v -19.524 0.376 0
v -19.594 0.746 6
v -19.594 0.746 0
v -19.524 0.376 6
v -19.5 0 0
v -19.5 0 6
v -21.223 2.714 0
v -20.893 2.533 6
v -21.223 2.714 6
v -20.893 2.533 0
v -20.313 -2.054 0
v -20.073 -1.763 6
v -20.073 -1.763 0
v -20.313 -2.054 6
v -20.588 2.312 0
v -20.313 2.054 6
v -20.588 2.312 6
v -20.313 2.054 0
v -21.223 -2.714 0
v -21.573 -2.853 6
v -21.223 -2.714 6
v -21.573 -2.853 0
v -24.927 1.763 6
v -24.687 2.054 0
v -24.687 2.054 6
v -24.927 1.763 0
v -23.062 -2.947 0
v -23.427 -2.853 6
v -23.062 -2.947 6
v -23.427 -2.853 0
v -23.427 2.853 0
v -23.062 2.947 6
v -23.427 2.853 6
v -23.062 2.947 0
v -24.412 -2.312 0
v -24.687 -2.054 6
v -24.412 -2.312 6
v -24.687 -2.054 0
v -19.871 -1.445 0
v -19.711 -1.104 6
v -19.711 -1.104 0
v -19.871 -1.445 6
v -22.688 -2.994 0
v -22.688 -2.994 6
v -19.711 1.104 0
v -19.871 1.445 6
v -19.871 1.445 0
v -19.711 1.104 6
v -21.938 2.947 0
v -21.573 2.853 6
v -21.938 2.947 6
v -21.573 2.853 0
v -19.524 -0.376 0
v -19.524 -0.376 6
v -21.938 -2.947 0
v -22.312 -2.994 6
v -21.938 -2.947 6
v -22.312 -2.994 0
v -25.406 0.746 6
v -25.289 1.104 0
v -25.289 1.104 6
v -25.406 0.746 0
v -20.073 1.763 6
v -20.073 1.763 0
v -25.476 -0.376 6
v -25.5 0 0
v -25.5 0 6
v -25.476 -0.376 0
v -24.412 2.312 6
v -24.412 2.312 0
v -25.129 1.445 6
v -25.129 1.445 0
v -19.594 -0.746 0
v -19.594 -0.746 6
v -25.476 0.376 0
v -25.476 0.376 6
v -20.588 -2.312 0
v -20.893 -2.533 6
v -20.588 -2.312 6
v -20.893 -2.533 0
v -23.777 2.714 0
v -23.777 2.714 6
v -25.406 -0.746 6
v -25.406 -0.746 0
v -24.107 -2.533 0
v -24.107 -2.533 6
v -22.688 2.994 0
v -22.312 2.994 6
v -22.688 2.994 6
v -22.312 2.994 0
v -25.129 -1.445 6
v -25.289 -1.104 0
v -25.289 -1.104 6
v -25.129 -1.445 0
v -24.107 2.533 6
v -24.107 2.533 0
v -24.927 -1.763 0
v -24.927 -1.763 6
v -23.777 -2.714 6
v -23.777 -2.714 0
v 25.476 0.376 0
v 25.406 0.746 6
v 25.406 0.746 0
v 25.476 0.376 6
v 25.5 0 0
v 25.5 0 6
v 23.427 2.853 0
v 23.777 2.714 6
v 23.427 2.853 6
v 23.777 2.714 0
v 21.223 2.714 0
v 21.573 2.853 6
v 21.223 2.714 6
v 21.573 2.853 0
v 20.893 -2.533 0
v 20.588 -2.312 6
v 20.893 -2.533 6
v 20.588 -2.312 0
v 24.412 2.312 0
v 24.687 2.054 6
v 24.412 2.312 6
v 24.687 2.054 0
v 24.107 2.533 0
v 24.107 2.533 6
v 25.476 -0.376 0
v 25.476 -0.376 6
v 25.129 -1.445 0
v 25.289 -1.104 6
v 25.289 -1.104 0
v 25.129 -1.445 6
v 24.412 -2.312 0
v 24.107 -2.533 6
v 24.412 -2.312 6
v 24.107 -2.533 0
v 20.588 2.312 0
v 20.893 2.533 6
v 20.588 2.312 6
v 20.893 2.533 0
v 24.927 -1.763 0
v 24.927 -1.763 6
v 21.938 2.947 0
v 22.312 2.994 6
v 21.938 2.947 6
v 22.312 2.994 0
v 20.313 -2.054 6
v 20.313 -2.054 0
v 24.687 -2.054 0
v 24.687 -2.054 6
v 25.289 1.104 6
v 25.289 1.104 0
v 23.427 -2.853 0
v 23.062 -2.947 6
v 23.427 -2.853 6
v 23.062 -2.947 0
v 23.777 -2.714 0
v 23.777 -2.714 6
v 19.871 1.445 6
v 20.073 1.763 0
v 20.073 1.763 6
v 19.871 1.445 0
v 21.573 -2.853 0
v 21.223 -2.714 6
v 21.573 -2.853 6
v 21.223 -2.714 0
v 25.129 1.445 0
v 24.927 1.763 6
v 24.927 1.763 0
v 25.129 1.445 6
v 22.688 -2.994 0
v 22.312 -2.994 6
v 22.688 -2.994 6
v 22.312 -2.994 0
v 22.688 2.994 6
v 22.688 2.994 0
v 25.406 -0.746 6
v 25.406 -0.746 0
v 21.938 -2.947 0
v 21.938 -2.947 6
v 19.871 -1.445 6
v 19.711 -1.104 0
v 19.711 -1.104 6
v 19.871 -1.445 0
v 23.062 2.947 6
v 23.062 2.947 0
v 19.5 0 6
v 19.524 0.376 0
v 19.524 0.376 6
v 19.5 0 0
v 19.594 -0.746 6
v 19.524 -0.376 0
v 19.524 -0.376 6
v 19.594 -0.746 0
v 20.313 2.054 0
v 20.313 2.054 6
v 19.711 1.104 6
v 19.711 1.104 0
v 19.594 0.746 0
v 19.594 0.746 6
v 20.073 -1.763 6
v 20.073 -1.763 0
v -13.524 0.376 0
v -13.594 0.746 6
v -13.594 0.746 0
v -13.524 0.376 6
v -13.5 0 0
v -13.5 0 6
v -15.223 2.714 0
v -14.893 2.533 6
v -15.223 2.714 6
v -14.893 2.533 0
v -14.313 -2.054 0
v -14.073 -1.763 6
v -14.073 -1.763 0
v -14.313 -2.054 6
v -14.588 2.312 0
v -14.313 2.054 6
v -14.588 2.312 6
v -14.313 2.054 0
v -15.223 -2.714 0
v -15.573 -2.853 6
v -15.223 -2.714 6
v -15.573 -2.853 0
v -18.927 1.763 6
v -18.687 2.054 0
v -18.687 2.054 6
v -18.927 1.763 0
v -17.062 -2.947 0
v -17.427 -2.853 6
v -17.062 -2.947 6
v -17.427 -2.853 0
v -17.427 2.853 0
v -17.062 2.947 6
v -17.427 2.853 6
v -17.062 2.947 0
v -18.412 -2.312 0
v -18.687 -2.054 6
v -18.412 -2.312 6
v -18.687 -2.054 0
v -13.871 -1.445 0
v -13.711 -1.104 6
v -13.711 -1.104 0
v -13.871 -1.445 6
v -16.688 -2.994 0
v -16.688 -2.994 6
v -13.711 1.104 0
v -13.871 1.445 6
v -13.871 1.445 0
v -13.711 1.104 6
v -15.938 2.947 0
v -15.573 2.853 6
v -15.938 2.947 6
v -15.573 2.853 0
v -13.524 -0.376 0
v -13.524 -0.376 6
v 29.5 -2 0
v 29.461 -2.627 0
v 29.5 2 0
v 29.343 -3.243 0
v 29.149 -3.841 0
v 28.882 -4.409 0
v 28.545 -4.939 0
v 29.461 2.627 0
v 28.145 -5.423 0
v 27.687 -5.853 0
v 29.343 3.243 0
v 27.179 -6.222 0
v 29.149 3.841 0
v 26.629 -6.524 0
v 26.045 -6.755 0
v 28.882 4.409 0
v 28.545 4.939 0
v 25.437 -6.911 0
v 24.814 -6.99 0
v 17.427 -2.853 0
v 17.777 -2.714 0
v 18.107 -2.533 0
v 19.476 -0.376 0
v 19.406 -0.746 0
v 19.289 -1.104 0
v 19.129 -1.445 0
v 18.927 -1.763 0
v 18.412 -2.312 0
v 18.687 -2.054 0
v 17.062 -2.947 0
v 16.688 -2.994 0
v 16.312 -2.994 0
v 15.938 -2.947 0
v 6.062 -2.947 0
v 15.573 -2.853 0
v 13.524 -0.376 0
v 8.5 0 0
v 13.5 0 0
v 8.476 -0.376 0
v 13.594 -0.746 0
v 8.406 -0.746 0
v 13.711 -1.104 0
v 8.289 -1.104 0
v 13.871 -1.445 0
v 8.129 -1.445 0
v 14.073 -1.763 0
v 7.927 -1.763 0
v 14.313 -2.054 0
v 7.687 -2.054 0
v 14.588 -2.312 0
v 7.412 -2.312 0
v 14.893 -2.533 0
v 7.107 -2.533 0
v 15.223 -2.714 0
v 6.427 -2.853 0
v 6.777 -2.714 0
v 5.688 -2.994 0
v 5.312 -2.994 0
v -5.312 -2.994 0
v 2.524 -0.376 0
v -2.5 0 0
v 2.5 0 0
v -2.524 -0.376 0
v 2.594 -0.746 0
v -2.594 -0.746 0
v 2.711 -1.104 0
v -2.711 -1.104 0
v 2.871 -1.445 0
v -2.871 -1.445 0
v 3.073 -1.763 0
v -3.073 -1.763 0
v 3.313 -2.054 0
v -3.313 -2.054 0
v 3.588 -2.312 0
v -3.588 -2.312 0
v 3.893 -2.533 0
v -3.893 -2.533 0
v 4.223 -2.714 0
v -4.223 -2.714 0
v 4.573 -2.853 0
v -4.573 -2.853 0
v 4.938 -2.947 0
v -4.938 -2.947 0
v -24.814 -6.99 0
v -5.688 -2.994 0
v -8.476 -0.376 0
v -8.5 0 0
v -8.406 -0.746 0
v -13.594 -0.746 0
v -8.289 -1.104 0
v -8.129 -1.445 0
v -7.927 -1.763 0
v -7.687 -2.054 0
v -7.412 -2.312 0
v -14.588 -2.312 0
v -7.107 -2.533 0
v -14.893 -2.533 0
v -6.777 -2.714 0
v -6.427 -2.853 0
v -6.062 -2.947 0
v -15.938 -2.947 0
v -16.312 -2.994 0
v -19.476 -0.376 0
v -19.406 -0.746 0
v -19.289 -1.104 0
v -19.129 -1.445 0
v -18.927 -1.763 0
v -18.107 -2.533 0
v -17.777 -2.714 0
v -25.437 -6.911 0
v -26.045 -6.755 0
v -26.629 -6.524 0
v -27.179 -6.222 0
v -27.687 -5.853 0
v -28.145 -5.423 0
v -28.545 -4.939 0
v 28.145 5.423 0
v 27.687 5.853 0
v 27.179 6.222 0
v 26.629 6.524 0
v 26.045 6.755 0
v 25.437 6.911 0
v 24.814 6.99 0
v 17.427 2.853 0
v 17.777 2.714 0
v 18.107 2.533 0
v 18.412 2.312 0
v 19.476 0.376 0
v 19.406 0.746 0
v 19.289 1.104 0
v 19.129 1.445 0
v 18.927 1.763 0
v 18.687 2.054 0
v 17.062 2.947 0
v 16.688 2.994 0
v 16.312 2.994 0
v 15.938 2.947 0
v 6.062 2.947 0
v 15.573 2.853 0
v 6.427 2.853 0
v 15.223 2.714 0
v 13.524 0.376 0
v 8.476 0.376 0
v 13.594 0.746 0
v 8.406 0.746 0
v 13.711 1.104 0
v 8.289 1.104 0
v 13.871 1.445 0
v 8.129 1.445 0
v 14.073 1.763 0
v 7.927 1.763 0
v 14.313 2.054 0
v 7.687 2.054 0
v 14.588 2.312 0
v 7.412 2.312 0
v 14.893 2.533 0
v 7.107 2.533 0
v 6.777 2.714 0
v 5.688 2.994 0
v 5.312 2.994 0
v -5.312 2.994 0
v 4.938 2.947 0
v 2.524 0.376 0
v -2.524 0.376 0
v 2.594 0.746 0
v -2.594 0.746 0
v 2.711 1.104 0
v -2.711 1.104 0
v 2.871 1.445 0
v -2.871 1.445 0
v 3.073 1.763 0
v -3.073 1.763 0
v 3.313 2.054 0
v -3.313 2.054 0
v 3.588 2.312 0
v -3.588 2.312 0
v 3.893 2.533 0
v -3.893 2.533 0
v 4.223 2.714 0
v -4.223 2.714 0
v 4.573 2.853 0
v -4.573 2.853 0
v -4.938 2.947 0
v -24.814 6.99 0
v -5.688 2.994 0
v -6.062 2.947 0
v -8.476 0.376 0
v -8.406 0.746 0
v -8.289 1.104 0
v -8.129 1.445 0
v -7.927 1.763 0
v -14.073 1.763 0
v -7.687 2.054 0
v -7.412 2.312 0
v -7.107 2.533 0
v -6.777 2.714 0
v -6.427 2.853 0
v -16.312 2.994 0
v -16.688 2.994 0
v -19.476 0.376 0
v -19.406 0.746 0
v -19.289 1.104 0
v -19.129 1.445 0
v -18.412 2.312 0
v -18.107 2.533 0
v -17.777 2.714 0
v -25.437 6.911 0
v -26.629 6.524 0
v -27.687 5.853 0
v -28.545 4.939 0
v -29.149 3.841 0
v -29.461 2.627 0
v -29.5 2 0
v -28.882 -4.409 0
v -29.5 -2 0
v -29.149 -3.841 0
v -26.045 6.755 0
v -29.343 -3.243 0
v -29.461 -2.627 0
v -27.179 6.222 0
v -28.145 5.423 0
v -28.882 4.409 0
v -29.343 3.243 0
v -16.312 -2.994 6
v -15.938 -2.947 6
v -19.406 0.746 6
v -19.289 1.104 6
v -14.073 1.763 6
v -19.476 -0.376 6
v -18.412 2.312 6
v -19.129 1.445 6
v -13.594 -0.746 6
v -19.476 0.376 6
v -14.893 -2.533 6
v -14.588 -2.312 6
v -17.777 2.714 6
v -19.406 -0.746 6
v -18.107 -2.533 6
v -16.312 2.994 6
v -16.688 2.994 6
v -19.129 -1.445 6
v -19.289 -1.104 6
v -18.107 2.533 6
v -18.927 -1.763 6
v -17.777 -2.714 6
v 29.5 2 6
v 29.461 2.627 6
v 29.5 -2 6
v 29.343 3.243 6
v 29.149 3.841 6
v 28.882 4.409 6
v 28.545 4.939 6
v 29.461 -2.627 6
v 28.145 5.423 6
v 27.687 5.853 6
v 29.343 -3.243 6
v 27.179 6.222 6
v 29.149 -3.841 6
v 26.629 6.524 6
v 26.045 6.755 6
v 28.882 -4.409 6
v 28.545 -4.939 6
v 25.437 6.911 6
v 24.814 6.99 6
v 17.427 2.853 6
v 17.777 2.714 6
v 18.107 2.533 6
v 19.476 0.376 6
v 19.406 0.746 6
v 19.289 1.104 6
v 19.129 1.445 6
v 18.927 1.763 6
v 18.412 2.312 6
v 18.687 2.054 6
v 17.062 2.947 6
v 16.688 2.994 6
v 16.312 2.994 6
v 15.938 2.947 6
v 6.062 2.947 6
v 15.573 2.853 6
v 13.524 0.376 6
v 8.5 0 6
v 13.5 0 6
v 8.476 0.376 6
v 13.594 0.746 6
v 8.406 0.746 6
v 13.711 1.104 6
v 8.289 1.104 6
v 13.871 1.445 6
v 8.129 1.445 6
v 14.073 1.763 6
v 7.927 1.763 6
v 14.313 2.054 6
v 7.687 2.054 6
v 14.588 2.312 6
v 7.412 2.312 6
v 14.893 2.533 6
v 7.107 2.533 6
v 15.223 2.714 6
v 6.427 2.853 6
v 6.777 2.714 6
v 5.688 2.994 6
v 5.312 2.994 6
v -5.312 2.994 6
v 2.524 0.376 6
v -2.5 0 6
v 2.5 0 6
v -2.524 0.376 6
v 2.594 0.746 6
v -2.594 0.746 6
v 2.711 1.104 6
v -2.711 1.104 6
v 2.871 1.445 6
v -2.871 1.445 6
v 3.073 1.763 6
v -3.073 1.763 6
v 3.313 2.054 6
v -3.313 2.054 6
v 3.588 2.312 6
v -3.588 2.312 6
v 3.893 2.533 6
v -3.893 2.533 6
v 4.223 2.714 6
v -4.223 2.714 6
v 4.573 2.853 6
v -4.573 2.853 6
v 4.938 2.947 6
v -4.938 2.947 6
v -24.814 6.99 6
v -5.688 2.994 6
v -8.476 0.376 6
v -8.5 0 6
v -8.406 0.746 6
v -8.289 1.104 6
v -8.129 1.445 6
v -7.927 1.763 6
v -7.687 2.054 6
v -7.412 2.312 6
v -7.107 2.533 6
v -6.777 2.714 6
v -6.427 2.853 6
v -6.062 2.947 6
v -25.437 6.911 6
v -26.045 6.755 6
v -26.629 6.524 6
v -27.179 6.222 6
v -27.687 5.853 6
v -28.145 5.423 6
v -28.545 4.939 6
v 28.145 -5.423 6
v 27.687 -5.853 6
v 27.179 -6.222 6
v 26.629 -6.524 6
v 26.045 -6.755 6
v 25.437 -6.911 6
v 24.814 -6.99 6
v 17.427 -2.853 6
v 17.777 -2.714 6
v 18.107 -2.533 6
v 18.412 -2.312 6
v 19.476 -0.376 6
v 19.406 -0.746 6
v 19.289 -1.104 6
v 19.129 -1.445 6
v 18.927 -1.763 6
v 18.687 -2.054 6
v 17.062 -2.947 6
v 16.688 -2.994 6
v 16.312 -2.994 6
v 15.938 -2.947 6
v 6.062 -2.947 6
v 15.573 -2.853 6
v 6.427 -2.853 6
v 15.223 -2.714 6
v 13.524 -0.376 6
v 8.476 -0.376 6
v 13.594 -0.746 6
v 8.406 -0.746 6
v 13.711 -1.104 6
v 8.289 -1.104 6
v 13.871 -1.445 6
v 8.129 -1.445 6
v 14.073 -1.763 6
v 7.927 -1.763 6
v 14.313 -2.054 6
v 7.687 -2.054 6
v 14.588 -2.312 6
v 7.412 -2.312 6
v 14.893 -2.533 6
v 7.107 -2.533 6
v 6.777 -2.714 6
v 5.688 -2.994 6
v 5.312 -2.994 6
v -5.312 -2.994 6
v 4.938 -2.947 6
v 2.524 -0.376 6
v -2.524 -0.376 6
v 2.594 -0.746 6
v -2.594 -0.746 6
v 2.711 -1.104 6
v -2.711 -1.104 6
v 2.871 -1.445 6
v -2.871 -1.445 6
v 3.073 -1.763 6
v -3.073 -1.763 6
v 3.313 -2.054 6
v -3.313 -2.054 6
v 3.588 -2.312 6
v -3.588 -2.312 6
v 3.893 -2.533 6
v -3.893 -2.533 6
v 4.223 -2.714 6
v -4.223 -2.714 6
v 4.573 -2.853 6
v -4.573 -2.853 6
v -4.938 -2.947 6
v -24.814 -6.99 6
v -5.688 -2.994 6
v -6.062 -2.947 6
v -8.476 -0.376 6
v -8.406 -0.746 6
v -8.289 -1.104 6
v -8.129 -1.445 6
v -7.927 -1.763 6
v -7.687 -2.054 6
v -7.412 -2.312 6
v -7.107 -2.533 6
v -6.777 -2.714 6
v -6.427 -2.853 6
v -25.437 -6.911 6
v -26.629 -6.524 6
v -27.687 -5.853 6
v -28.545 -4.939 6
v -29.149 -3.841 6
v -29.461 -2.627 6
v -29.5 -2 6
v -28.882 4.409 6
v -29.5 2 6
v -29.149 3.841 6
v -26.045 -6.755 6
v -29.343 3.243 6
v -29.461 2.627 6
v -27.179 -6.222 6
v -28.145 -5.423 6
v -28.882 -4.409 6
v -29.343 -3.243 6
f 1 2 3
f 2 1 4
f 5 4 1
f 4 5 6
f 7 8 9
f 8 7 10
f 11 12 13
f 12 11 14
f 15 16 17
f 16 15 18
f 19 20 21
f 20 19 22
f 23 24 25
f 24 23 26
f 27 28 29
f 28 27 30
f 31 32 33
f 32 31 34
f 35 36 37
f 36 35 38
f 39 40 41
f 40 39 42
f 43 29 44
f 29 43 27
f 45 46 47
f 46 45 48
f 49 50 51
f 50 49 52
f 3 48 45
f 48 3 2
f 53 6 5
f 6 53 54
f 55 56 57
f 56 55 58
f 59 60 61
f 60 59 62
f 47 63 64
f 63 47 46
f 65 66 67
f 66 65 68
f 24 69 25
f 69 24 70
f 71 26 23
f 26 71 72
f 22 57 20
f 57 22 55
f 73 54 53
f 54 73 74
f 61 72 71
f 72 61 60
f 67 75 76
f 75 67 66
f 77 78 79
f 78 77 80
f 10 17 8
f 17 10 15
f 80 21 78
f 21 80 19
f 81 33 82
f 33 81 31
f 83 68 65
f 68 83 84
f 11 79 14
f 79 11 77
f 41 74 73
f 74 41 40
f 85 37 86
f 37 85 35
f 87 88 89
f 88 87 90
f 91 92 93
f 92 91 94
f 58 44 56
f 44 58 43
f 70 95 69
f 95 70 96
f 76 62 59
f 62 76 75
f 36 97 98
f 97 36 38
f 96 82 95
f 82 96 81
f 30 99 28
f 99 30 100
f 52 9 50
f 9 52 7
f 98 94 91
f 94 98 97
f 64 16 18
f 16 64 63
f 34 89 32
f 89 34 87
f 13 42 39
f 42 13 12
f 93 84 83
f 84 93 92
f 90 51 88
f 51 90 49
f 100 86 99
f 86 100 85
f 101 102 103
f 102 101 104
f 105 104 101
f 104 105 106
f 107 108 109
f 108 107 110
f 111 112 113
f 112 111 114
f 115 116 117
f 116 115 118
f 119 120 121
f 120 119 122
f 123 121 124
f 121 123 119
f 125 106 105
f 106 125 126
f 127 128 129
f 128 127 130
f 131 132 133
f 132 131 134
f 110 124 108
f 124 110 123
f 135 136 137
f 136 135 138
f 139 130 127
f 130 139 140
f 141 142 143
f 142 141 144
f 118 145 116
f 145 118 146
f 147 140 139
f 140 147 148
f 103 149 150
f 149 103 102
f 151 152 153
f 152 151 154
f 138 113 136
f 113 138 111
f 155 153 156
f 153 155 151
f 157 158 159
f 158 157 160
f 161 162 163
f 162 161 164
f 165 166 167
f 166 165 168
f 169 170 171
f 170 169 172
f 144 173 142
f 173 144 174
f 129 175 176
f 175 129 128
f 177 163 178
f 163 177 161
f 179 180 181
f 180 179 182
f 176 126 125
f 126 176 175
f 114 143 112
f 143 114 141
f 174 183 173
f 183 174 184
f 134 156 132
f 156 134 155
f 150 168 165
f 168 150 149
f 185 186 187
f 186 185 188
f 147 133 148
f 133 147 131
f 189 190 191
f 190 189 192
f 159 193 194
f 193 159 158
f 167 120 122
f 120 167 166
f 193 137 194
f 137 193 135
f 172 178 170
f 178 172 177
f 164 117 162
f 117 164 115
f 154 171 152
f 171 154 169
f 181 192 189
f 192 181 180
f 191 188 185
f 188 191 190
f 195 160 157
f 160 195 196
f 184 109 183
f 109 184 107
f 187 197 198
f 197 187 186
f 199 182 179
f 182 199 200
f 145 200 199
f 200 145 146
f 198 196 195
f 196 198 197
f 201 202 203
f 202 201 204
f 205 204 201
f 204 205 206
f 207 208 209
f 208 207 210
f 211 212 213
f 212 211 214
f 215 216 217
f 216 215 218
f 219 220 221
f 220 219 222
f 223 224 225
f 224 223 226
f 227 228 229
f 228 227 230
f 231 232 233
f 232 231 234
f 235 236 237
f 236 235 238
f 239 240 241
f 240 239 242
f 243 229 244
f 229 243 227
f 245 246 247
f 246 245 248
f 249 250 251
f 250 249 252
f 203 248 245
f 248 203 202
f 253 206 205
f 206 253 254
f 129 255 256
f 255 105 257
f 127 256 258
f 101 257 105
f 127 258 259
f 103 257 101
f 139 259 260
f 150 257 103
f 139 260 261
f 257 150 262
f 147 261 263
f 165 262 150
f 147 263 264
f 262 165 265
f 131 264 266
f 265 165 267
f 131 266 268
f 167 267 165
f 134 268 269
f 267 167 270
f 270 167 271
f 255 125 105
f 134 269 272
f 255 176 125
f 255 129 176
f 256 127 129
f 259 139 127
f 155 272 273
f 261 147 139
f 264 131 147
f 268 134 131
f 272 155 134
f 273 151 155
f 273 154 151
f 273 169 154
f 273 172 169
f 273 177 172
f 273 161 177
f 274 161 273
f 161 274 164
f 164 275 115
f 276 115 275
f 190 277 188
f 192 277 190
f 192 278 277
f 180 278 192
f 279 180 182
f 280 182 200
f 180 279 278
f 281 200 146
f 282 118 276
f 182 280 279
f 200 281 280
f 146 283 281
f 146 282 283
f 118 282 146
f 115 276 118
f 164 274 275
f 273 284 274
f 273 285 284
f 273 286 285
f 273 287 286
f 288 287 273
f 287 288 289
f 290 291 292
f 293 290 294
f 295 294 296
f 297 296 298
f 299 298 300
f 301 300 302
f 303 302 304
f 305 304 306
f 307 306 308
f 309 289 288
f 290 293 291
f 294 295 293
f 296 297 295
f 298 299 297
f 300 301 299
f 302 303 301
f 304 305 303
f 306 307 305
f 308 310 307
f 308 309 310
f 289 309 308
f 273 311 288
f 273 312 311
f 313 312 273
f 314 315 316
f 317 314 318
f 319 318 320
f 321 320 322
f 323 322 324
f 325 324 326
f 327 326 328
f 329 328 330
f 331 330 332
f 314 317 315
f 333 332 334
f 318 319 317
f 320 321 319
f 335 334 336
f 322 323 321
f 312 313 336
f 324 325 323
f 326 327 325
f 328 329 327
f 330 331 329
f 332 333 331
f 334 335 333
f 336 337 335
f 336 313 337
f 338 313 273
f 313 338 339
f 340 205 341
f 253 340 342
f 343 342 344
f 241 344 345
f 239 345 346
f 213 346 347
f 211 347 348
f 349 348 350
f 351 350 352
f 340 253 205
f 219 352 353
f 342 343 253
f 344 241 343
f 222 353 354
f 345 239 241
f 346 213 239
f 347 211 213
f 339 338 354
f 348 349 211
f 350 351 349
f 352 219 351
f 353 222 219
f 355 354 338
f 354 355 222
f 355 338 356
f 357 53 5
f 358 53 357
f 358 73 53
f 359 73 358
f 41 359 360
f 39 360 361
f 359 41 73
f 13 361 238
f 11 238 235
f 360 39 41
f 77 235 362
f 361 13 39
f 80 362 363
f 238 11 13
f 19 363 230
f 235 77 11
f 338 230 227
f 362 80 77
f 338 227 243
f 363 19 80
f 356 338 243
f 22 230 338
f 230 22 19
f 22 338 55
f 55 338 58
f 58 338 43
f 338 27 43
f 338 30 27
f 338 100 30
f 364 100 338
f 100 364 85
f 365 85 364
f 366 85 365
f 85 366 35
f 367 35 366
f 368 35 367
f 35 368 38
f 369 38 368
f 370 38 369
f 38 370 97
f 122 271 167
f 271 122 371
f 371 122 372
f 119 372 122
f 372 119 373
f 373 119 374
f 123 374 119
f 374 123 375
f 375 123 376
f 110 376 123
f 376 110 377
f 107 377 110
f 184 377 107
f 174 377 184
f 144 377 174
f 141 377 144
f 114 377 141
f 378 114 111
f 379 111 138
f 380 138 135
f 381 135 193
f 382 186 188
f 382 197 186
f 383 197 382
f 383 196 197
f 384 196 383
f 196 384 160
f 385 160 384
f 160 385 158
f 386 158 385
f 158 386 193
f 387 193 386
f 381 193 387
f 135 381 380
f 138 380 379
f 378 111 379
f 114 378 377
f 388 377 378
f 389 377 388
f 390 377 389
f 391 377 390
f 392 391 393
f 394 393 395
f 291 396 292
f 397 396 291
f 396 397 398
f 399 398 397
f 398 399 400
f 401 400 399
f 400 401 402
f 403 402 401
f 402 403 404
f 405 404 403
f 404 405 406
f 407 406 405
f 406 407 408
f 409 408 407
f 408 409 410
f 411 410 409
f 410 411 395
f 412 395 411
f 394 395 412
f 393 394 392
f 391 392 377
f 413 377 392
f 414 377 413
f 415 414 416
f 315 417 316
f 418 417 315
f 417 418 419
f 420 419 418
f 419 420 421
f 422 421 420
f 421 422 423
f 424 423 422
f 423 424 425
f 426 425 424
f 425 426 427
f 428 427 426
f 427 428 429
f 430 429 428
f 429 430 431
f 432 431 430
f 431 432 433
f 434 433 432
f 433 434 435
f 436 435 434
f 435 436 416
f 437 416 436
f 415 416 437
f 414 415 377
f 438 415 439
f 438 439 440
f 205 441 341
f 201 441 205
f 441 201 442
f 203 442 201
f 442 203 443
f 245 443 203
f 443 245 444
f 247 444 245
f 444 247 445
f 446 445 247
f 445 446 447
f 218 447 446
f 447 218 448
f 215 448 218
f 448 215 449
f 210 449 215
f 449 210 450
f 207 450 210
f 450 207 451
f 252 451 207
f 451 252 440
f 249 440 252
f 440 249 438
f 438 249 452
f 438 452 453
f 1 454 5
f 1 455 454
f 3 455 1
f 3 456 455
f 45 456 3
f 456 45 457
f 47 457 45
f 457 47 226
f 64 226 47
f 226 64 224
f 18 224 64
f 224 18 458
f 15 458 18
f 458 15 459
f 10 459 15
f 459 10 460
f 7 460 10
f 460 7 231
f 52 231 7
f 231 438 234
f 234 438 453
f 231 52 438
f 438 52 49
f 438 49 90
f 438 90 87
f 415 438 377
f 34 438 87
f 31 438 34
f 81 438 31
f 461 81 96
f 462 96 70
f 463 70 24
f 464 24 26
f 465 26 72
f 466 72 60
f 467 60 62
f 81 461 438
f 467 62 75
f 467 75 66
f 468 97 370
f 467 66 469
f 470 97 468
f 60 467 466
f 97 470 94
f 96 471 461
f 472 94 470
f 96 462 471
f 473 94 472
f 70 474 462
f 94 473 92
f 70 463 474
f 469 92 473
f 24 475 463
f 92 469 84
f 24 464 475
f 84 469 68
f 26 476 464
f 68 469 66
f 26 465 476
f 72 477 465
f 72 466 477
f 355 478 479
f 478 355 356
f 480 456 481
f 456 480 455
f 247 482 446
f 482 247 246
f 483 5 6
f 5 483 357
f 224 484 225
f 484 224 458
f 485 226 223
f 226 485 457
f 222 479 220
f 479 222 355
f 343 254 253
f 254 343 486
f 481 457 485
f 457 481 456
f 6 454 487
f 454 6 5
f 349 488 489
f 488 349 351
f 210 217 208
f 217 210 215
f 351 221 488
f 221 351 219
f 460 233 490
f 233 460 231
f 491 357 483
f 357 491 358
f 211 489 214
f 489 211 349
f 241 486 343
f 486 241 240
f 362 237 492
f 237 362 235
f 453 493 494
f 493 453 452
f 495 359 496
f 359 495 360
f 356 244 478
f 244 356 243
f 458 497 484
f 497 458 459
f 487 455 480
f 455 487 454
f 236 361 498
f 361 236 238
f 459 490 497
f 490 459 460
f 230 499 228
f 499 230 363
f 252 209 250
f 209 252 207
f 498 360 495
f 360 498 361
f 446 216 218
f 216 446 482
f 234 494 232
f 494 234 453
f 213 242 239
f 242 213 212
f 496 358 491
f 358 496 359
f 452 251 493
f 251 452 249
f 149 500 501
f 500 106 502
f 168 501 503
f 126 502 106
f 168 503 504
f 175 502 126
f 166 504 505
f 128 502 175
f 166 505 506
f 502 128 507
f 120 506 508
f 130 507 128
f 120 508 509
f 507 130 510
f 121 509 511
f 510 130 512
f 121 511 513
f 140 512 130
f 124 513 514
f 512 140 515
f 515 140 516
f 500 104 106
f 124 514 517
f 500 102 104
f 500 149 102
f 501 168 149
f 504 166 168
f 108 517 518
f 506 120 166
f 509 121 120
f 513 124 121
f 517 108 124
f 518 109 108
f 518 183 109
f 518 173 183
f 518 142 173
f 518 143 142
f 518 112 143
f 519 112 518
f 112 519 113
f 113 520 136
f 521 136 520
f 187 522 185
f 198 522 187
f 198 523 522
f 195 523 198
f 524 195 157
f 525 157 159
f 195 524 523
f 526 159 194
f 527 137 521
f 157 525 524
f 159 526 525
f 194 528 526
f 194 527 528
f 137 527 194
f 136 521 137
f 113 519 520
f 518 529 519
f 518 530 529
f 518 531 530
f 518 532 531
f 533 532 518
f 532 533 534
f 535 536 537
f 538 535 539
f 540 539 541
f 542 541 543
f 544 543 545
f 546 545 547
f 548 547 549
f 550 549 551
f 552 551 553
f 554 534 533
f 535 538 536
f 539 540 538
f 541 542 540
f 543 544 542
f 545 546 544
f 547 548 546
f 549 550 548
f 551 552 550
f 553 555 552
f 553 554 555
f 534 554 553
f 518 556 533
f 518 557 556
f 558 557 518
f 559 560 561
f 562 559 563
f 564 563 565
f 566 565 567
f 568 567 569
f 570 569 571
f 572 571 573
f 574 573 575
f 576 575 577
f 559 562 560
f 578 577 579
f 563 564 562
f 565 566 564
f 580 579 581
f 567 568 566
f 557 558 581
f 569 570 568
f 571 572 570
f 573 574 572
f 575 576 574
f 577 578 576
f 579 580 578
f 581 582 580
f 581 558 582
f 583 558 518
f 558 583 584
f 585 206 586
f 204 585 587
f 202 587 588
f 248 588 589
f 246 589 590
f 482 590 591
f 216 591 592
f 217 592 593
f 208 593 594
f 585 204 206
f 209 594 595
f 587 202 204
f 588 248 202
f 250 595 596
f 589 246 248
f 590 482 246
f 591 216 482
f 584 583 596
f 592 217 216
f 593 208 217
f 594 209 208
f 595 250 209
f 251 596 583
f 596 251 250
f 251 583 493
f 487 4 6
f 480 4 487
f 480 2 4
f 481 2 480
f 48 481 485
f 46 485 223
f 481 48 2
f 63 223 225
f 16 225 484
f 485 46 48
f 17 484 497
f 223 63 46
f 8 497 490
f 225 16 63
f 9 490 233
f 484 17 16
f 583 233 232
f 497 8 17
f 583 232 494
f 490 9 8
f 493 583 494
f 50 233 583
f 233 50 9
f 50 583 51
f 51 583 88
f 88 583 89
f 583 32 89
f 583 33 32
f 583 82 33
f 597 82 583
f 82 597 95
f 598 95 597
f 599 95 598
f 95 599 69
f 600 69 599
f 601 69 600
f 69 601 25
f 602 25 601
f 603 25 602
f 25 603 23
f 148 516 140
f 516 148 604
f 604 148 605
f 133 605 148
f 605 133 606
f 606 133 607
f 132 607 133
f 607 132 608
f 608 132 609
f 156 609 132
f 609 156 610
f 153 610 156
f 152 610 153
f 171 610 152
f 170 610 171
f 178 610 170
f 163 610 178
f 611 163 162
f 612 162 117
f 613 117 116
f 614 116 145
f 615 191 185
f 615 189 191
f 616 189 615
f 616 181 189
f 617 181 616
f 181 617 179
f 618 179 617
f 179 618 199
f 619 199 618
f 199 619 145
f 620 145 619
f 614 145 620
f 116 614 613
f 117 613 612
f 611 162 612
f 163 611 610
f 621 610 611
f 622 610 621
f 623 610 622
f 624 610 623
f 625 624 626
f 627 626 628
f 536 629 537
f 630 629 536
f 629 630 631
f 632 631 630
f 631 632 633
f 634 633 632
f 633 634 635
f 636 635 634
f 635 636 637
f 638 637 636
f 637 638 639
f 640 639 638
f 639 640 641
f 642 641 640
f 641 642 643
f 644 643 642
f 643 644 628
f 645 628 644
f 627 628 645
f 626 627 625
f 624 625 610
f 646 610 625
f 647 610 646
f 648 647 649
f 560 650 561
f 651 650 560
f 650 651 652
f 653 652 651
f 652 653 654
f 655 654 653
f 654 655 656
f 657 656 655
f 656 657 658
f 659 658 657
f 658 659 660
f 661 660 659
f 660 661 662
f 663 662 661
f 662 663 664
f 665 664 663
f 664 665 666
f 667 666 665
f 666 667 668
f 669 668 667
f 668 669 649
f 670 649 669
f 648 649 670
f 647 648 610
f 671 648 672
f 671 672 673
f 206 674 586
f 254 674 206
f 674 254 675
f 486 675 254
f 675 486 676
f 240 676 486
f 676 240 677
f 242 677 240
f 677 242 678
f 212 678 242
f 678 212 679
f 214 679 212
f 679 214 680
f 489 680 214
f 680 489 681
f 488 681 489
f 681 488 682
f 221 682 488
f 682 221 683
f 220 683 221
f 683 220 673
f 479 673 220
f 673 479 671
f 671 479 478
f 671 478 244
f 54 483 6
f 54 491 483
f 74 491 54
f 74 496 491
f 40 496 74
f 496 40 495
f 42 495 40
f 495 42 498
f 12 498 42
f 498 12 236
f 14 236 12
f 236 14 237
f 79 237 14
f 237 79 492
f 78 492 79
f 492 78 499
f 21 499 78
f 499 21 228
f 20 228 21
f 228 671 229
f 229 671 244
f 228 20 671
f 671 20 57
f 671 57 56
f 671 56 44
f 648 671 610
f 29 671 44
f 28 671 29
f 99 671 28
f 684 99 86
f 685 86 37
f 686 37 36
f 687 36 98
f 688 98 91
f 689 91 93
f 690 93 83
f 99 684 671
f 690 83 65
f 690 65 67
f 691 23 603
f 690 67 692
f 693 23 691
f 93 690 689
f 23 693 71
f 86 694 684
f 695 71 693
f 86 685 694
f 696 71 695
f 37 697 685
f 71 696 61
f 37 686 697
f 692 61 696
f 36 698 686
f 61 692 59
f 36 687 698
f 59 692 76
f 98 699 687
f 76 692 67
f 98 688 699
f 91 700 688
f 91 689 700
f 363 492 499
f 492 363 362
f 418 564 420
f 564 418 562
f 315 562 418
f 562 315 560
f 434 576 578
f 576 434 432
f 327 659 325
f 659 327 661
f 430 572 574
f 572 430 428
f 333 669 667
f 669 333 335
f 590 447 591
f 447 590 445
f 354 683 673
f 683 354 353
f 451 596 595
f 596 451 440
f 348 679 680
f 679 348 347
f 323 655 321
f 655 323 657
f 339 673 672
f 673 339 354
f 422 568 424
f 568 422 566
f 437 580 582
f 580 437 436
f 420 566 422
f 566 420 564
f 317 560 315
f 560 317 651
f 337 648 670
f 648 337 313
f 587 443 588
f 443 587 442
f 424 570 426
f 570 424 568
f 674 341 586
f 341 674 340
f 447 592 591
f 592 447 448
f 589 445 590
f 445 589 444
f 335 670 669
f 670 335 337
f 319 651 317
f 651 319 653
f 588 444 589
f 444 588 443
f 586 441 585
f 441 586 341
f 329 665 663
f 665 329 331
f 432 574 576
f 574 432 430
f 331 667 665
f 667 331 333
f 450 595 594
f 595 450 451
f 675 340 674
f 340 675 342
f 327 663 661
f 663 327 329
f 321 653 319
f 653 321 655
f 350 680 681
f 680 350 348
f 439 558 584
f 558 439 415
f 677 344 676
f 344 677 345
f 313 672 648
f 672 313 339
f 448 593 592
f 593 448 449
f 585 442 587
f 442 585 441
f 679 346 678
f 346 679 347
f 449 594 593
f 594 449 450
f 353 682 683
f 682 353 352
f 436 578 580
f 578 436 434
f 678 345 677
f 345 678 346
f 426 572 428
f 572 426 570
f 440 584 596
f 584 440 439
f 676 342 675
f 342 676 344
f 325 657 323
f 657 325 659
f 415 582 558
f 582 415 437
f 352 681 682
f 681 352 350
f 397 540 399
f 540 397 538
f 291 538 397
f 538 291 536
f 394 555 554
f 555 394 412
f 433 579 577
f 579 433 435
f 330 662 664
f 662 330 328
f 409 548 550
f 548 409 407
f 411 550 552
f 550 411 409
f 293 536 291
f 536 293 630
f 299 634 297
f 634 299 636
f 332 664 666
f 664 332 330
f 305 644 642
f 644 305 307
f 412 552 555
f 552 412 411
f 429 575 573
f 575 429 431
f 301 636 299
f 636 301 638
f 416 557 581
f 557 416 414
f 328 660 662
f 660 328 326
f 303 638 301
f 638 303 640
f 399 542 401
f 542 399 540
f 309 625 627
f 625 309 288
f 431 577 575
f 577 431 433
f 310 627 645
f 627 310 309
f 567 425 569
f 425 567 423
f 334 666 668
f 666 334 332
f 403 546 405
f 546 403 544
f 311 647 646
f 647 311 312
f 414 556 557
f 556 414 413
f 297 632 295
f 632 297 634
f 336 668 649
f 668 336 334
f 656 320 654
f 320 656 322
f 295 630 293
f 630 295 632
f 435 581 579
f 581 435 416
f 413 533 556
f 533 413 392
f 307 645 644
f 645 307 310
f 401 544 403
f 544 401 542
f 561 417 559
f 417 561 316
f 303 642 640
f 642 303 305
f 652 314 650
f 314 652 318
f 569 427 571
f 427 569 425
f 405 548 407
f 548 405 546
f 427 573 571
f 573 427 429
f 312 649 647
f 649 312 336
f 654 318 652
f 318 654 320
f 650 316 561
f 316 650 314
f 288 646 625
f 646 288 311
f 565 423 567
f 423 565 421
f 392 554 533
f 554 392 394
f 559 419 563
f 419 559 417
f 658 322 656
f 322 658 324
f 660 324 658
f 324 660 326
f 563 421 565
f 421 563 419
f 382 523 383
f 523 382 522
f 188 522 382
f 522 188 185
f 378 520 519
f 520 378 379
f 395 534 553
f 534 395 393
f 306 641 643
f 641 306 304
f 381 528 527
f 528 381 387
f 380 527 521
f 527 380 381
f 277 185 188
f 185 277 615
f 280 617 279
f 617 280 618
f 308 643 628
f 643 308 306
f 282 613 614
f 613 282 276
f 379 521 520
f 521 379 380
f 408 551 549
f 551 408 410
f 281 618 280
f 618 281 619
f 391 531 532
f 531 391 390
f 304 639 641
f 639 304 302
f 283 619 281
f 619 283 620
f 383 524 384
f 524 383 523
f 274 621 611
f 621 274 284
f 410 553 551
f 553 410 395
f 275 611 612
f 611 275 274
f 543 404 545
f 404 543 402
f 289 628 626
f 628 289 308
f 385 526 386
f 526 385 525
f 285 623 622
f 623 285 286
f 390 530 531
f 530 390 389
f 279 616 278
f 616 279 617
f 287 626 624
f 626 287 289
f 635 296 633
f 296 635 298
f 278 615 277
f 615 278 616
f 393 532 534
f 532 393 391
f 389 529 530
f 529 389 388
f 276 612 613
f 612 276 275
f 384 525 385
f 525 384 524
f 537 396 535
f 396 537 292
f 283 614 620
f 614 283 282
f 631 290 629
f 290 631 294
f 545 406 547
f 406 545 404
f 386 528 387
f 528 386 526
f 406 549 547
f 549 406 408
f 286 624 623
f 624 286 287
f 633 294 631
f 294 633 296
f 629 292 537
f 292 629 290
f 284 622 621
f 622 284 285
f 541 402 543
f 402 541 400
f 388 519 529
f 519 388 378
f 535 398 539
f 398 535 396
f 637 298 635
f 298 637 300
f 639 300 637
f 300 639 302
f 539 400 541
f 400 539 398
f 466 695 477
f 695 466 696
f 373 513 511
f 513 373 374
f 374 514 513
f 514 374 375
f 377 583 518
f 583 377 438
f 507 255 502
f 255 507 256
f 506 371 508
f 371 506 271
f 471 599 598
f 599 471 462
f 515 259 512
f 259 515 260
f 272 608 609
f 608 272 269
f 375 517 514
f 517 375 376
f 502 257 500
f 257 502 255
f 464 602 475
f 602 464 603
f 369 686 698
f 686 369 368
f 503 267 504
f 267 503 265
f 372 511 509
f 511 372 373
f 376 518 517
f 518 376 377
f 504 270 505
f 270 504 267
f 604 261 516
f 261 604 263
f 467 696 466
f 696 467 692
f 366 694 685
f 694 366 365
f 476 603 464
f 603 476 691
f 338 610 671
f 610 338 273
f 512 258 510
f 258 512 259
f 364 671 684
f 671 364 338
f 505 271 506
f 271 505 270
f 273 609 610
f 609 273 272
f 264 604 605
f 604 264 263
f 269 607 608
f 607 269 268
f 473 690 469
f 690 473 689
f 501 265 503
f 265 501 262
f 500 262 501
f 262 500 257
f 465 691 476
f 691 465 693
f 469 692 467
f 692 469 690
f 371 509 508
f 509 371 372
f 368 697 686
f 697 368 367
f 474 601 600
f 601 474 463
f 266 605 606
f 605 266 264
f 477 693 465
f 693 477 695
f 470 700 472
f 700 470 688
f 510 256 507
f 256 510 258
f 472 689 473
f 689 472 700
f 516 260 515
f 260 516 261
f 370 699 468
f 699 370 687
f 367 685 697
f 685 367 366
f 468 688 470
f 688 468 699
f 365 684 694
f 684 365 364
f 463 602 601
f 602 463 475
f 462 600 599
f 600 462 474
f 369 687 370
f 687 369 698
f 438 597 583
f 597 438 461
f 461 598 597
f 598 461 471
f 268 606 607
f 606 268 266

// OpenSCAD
$fn = 50;


difference() {
	union() {
		hull() {
			translate(v = [-24.5000000000, 2.0000000000, 0]) {
				cylinder(h = 6, r = 5);
			}
			translate(v = [24.5000000000, 2.0000000000, 0]) {
				cylinder(h = 6, r = 5);
			}
			translate(v = [-24.5000000000, -2.0000000000, 0]) {
				cylinder(h = 6, r = 5);
			}
			translate(v = [24.5000000000, -2.0000000000, 0]) {
				cylinder(h = 6, r = 5);
			}
		}
	}
	union() {
		#translate(v = [-22.5000000000, 0.0000000000, -100.0000000000]) {
			cylinder(h = 200, r = 3.0000000000);
		}
		#translate(v = [-22.5000000000, 0.0000000000, -100.0000000000]) {
			cylinder(h = 200, r = 3.0000000000);
		}
		#translate(v = [22.5000000000, 0.0000000000, -100.0000000000]) {
			cylinder(h = 200, r = 3.0000000000);
		}
		#translate(v = [22.5000000000, 0.0000000000, -100.0000000000]) {
			cylinder(h = 200, r = 3.0000000000);
		}
		#translate(v = [-16.5000000000, 0, 0]) {
			cylinder(h = 6, r = 3.0000000000);
		}
		#translate(v = [-5.5000000000, 0, 0]) {
			cylinder(h = 6, r = 3.0000000000);
		}
		#translate(v = [5.5000000000, 0, 0]) {
			cylinder(h = 6, r = 3.0000000000);
		}
		#translate(v = [16.5000000000, 0, 0]) {
			cylinder(h = 6, r = 3.0000000000);
		}
	}
}
